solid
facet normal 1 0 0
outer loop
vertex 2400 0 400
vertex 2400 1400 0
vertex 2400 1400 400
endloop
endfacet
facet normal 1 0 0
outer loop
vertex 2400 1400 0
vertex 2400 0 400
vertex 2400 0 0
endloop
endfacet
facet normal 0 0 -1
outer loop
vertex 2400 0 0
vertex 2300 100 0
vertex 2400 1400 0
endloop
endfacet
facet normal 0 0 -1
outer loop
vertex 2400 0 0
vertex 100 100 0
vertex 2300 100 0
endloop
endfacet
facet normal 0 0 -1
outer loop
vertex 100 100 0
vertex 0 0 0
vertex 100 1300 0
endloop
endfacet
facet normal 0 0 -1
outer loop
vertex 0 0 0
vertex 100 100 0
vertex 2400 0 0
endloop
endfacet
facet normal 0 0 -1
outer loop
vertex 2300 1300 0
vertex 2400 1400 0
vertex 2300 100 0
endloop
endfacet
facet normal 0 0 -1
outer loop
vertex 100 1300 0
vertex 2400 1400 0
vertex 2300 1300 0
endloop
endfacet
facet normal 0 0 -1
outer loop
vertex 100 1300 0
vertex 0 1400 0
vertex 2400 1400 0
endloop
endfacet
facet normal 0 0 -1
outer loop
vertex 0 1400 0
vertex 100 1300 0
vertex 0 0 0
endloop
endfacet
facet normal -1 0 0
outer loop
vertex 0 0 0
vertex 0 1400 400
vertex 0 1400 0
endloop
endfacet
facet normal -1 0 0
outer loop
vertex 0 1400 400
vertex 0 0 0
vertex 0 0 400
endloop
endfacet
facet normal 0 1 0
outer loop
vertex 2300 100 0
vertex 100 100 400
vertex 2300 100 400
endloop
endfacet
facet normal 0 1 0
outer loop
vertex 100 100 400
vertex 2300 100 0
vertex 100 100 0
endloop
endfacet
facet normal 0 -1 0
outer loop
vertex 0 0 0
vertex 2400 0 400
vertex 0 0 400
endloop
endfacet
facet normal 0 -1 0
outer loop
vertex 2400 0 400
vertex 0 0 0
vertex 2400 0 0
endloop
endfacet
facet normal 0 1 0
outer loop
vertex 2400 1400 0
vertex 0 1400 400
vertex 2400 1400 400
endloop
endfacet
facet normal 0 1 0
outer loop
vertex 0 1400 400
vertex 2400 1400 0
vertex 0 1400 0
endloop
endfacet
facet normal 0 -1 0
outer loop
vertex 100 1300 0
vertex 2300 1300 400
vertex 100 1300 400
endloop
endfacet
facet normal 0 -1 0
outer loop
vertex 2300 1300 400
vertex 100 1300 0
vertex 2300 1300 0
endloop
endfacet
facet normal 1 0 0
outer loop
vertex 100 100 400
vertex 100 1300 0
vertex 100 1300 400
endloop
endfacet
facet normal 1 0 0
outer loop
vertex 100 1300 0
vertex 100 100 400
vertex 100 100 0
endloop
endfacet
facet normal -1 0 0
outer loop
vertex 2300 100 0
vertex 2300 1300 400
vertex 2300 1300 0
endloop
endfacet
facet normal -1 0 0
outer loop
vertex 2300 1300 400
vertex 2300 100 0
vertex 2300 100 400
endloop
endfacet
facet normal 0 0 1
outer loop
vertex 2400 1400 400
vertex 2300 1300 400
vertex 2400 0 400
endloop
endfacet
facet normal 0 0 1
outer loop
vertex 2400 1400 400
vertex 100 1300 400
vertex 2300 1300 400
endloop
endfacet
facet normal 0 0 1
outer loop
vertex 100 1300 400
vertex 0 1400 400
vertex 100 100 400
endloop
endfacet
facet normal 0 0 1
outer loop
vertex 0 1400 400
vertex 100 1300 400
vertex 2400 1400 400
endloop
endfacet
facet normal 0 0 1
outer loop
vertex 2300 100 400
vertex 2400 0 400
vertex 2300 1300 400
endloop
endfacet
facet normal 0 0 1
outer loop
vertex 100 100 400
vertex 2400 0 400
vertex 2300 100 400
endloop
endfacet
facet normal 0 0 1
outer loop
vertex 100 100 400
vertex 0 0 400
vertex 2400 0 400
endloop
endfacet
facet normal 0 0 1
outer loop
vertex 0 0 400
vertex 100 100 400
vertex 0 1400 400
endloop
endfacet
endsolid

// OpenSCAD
// Generated from plan.json; millimetres. Not a structural design.
// Open in OpenSCAD. Increase explode_mm to inspect courses.
explode_mm = 0;
$fn = 24;
show_fixing_paths = false;

// first-bed-01-C1-S
translate([0, 0, 0+0*explode_mm])
  color([0.70,0.52,0.33]) cube([2400, 100, 200]);
// first-bed-01-C1-N
translate([0, 1300, 0+0*explode_mm])
  color([0.70,0.52,0.33]) cube([2400, 100, 200]);
// first-bed-01-C1-W
translate([0, 100, 0+0*explode_mm])
  color([0.70,0.52,0.33]) cube([100, 1200, 200]);
// first-bed-01-C1-E
translate([2300, 100, 0+0*explode_mm])
  color([0.70,0.52,0.33]) cube([100, 1200, 200]);
// first-bed-01-C2-S
translate([0, 0, 200+1*explode_mm])
  color([0.70,0.52,0.33]) cube([2400, 100, 200]);
// first-bed-01-C2-N
translate([0, 1300, 200+1*explode_mm])
  color([0.70,0.52,0.33]) cube([2400, 100, 200]);
// first-bed-01-C2-W
translate([0, 100, 200+1*explode_mm])
  color([0.70,0.52,0.33]) cube([100, 1200, 200]);
// first-bed-01-C2-E
translate([2300, 100, 200+1*explode_mm])
  color([0.70,0.52,0.33]) cube([100, 1200, 200]);
if (show_fixing_paths) translate([50.0, 1400, 50.0+0*explode_mm]) rotate([90,0,0]) color([0.8,0.1,0.1]) cylinder(d=7, h=150);
if (show_fixing_paths) translate([50.0, 1400, 150.0+0*explode_mm]) rotate([90,0,0]) color([0.8,0.1,0.1]) cylinder(d=7, h=150);
if (show_fixing_paths) translate([2350.0, 1400, 50.0+0*explode_mm]) rotate([90,0,0]) color([0.8,0.1,0.1]) cylinder(d=7, h=150);
if (show_fixing_paths) translate([2350.0, 1400, 150.0+0*explode_mm]) rotate([90,0,0]) color([0.8,0.1,0.1]) cylinder(d=7, h=150);
if (show_fixing_paths) translate([50.0, 0, 50.0+0*explode_mm]) rotate([-90,0,0]) color([0.8,0.1,0.1]) cylinder(d=7, h=150);
if (show_fixing_paths) translate([50.0, 0, 150.0+0*explode_mm]) rotate([-90,0,0]) color([0.8,0.1,0.1]) cylinder(d=7, h=150);
if (show_fixing_paths) translate([2350.0, 0, 50.0+0*explode_mm]) rotate([-90,0,0]) color([0.8,0.1,0.1]) cylinder(d=7, h=150);
if (show_fixing_paths) translate([2350.0, 0, 150.0+0*explode_mm]) rotate([-90,0,0]) color([0.8,0.1,0.1]) cylinder(d=7, h=150);
if (show_fixing_paths) translate([2350.0, 300.0, 400+1*explode_mm]) rotate([180,0,0]) color([0.8,0.1,0.1]) cylinder(d=7, h=250);
if (show_fixing_paths) translate([2350.0, 700.0, 400+1*explode_mm]) rotate([180,0,0]) color([0.8,0.1,0.1]) cylinder(d=7, h=250);
if (show_fixing_paths) translate([2350.0, 1100.0, 400+1*explode_mm]) rotate([180,0,0]) color([0.8,0.1,0.1]) cylinder(d=7, h=250);
if (show_fixing_paths) translate([50.0, 1400, 250.0+1*explode_mm]) rotate([90,0,0]) color([0.8,0.1,0.1]) cylinder(d=7, h=150);
if (show_fixing_paths) translate([50.0, 1400, 350.0+1*explode_mm]) rotate([90,0,0]) color([0.8,0.1,0.1]) cylinder(d=7, h=150);
if (show_fixing_paths) translate([2350.0, 1400, 250.0+1*explode_mm]) rotate([90,0,0]) color([0.8,0.1,0.1]) cylinder(d=7, h=150);
if (show_fixing_paths) translate([2350.0, 1400, 350.0+1*explode_mm]) rotate([90,0,0]) color([0.8,0.1,0.1]) cylinder(d=7, h=150);
if (show_fixing_paths) translate([200.0, 1350.0, 400+1*explode_mm]) rotate([180,0,0]) color([0.8,0.1,0.1]) cylinder(d=7, h=250);
if (show_fixing_paths) translate([700.0, 1350.0, 400+1*explode_mm]) rotate([180,0,0]) color([0.8,0.1,0.1]) cylinder(d=7, h=250);
if (show_fixing_paths) translate([1200.0, 1350.0, 400+1*explode_mm]) rotate([180,0,0]) color([0.8,0.1,0.1]) cylinder(d=7, h=250);
if (show_fixing_paths) translate([1700.0, 1350.0, 400+1*explode_mm]) rotate([180,0,0]) color([0.8,0.1,0.1]) cylinder(d=7, h=250);
if (show_fixing_paths) translate([2200.0, 1350.0, 400+1*explode_mm]) rotate([180,0,0]) color([0.8,0.1,0.1]) cylinder(d=7, h=250);
if (show_fixing_paths) translate([50.0, 0, 250.0+1*explode_mm]) rotate([-90,0,0]) color([0.8,0.1,0.1]) cylinder(d=7, h=150);
if (show_fixing_paths) translate([50.0, 0, 350.0+1*explode_mm]) rotate([-90,0,0]) color([0.8,0.1,0.1]) cylinder(d=7, h=150);
if (show_fixing_paths) translate([2350.0, 0, 250.0+1*explode_mm]) rotate([-90,0,0]) color([0.8,0.1,0.1]) cylinder(d=7, h=150);
if (show_fixing_paths) translate([2350.0, 0, 350.0+1*explode_mm]) rotate([-90,0,0]) color([0.8,0.1,0.1]) cylinder(d=7, h=150);
if (show_fixing_paths) translate([200.0, 50.0, 400+1*explode_mm]) rotate([180,0,0]) color([0.8,0.1,0.1]) cylinder(d=7, h=250);
if (show_fixing_paths) translate([700.0, 50.0, 400+1*explode_mm]) rotate([180,0,0]) color([0.8,0.1,0.1]) cylinder(d=7, h=250);
if (show_fixing_paths) translate([1200.0, 50.0, 400+1*explode_mm]) rotate([180,0,0]) color([0.8,0.1,0.1]) cylinder(d=7, h=250);
if (show_fixing_paths) translate([1700.0, 50.0, 400+1*explode_mm]) rotate([180,0,0]) color([0.8,0.1,0.1]) cylinder(d=7, h=250);
if (show_fixing_paths) translate([2200.0, 50.0, 400+1*explode_mm]) rotate([180,0,0]) color([0.8,0.1,0.1]) cylinder(d=7, h=250);
if (show_fixing_paths) translate([50.0, 300.0, 400+1*explode_mm]) rotate([180,0,0]) color([0.8,0.1,0.1]) cylinder(d=7, h=250);
if (show_fixing_paths) translate([50.0, 700.0, 400+1*explode_mm]) rotate([180,0,0]) color([0.8,0.1,0.1]) cylinder(d=7, h=250);
if (show_fixing_paths) translate([50.0, 1100.0, 400+1*explode_mm]) rotate([180,0,0]) color([0.8,0.1,0.1]) cylinder(d=7, h=250);
